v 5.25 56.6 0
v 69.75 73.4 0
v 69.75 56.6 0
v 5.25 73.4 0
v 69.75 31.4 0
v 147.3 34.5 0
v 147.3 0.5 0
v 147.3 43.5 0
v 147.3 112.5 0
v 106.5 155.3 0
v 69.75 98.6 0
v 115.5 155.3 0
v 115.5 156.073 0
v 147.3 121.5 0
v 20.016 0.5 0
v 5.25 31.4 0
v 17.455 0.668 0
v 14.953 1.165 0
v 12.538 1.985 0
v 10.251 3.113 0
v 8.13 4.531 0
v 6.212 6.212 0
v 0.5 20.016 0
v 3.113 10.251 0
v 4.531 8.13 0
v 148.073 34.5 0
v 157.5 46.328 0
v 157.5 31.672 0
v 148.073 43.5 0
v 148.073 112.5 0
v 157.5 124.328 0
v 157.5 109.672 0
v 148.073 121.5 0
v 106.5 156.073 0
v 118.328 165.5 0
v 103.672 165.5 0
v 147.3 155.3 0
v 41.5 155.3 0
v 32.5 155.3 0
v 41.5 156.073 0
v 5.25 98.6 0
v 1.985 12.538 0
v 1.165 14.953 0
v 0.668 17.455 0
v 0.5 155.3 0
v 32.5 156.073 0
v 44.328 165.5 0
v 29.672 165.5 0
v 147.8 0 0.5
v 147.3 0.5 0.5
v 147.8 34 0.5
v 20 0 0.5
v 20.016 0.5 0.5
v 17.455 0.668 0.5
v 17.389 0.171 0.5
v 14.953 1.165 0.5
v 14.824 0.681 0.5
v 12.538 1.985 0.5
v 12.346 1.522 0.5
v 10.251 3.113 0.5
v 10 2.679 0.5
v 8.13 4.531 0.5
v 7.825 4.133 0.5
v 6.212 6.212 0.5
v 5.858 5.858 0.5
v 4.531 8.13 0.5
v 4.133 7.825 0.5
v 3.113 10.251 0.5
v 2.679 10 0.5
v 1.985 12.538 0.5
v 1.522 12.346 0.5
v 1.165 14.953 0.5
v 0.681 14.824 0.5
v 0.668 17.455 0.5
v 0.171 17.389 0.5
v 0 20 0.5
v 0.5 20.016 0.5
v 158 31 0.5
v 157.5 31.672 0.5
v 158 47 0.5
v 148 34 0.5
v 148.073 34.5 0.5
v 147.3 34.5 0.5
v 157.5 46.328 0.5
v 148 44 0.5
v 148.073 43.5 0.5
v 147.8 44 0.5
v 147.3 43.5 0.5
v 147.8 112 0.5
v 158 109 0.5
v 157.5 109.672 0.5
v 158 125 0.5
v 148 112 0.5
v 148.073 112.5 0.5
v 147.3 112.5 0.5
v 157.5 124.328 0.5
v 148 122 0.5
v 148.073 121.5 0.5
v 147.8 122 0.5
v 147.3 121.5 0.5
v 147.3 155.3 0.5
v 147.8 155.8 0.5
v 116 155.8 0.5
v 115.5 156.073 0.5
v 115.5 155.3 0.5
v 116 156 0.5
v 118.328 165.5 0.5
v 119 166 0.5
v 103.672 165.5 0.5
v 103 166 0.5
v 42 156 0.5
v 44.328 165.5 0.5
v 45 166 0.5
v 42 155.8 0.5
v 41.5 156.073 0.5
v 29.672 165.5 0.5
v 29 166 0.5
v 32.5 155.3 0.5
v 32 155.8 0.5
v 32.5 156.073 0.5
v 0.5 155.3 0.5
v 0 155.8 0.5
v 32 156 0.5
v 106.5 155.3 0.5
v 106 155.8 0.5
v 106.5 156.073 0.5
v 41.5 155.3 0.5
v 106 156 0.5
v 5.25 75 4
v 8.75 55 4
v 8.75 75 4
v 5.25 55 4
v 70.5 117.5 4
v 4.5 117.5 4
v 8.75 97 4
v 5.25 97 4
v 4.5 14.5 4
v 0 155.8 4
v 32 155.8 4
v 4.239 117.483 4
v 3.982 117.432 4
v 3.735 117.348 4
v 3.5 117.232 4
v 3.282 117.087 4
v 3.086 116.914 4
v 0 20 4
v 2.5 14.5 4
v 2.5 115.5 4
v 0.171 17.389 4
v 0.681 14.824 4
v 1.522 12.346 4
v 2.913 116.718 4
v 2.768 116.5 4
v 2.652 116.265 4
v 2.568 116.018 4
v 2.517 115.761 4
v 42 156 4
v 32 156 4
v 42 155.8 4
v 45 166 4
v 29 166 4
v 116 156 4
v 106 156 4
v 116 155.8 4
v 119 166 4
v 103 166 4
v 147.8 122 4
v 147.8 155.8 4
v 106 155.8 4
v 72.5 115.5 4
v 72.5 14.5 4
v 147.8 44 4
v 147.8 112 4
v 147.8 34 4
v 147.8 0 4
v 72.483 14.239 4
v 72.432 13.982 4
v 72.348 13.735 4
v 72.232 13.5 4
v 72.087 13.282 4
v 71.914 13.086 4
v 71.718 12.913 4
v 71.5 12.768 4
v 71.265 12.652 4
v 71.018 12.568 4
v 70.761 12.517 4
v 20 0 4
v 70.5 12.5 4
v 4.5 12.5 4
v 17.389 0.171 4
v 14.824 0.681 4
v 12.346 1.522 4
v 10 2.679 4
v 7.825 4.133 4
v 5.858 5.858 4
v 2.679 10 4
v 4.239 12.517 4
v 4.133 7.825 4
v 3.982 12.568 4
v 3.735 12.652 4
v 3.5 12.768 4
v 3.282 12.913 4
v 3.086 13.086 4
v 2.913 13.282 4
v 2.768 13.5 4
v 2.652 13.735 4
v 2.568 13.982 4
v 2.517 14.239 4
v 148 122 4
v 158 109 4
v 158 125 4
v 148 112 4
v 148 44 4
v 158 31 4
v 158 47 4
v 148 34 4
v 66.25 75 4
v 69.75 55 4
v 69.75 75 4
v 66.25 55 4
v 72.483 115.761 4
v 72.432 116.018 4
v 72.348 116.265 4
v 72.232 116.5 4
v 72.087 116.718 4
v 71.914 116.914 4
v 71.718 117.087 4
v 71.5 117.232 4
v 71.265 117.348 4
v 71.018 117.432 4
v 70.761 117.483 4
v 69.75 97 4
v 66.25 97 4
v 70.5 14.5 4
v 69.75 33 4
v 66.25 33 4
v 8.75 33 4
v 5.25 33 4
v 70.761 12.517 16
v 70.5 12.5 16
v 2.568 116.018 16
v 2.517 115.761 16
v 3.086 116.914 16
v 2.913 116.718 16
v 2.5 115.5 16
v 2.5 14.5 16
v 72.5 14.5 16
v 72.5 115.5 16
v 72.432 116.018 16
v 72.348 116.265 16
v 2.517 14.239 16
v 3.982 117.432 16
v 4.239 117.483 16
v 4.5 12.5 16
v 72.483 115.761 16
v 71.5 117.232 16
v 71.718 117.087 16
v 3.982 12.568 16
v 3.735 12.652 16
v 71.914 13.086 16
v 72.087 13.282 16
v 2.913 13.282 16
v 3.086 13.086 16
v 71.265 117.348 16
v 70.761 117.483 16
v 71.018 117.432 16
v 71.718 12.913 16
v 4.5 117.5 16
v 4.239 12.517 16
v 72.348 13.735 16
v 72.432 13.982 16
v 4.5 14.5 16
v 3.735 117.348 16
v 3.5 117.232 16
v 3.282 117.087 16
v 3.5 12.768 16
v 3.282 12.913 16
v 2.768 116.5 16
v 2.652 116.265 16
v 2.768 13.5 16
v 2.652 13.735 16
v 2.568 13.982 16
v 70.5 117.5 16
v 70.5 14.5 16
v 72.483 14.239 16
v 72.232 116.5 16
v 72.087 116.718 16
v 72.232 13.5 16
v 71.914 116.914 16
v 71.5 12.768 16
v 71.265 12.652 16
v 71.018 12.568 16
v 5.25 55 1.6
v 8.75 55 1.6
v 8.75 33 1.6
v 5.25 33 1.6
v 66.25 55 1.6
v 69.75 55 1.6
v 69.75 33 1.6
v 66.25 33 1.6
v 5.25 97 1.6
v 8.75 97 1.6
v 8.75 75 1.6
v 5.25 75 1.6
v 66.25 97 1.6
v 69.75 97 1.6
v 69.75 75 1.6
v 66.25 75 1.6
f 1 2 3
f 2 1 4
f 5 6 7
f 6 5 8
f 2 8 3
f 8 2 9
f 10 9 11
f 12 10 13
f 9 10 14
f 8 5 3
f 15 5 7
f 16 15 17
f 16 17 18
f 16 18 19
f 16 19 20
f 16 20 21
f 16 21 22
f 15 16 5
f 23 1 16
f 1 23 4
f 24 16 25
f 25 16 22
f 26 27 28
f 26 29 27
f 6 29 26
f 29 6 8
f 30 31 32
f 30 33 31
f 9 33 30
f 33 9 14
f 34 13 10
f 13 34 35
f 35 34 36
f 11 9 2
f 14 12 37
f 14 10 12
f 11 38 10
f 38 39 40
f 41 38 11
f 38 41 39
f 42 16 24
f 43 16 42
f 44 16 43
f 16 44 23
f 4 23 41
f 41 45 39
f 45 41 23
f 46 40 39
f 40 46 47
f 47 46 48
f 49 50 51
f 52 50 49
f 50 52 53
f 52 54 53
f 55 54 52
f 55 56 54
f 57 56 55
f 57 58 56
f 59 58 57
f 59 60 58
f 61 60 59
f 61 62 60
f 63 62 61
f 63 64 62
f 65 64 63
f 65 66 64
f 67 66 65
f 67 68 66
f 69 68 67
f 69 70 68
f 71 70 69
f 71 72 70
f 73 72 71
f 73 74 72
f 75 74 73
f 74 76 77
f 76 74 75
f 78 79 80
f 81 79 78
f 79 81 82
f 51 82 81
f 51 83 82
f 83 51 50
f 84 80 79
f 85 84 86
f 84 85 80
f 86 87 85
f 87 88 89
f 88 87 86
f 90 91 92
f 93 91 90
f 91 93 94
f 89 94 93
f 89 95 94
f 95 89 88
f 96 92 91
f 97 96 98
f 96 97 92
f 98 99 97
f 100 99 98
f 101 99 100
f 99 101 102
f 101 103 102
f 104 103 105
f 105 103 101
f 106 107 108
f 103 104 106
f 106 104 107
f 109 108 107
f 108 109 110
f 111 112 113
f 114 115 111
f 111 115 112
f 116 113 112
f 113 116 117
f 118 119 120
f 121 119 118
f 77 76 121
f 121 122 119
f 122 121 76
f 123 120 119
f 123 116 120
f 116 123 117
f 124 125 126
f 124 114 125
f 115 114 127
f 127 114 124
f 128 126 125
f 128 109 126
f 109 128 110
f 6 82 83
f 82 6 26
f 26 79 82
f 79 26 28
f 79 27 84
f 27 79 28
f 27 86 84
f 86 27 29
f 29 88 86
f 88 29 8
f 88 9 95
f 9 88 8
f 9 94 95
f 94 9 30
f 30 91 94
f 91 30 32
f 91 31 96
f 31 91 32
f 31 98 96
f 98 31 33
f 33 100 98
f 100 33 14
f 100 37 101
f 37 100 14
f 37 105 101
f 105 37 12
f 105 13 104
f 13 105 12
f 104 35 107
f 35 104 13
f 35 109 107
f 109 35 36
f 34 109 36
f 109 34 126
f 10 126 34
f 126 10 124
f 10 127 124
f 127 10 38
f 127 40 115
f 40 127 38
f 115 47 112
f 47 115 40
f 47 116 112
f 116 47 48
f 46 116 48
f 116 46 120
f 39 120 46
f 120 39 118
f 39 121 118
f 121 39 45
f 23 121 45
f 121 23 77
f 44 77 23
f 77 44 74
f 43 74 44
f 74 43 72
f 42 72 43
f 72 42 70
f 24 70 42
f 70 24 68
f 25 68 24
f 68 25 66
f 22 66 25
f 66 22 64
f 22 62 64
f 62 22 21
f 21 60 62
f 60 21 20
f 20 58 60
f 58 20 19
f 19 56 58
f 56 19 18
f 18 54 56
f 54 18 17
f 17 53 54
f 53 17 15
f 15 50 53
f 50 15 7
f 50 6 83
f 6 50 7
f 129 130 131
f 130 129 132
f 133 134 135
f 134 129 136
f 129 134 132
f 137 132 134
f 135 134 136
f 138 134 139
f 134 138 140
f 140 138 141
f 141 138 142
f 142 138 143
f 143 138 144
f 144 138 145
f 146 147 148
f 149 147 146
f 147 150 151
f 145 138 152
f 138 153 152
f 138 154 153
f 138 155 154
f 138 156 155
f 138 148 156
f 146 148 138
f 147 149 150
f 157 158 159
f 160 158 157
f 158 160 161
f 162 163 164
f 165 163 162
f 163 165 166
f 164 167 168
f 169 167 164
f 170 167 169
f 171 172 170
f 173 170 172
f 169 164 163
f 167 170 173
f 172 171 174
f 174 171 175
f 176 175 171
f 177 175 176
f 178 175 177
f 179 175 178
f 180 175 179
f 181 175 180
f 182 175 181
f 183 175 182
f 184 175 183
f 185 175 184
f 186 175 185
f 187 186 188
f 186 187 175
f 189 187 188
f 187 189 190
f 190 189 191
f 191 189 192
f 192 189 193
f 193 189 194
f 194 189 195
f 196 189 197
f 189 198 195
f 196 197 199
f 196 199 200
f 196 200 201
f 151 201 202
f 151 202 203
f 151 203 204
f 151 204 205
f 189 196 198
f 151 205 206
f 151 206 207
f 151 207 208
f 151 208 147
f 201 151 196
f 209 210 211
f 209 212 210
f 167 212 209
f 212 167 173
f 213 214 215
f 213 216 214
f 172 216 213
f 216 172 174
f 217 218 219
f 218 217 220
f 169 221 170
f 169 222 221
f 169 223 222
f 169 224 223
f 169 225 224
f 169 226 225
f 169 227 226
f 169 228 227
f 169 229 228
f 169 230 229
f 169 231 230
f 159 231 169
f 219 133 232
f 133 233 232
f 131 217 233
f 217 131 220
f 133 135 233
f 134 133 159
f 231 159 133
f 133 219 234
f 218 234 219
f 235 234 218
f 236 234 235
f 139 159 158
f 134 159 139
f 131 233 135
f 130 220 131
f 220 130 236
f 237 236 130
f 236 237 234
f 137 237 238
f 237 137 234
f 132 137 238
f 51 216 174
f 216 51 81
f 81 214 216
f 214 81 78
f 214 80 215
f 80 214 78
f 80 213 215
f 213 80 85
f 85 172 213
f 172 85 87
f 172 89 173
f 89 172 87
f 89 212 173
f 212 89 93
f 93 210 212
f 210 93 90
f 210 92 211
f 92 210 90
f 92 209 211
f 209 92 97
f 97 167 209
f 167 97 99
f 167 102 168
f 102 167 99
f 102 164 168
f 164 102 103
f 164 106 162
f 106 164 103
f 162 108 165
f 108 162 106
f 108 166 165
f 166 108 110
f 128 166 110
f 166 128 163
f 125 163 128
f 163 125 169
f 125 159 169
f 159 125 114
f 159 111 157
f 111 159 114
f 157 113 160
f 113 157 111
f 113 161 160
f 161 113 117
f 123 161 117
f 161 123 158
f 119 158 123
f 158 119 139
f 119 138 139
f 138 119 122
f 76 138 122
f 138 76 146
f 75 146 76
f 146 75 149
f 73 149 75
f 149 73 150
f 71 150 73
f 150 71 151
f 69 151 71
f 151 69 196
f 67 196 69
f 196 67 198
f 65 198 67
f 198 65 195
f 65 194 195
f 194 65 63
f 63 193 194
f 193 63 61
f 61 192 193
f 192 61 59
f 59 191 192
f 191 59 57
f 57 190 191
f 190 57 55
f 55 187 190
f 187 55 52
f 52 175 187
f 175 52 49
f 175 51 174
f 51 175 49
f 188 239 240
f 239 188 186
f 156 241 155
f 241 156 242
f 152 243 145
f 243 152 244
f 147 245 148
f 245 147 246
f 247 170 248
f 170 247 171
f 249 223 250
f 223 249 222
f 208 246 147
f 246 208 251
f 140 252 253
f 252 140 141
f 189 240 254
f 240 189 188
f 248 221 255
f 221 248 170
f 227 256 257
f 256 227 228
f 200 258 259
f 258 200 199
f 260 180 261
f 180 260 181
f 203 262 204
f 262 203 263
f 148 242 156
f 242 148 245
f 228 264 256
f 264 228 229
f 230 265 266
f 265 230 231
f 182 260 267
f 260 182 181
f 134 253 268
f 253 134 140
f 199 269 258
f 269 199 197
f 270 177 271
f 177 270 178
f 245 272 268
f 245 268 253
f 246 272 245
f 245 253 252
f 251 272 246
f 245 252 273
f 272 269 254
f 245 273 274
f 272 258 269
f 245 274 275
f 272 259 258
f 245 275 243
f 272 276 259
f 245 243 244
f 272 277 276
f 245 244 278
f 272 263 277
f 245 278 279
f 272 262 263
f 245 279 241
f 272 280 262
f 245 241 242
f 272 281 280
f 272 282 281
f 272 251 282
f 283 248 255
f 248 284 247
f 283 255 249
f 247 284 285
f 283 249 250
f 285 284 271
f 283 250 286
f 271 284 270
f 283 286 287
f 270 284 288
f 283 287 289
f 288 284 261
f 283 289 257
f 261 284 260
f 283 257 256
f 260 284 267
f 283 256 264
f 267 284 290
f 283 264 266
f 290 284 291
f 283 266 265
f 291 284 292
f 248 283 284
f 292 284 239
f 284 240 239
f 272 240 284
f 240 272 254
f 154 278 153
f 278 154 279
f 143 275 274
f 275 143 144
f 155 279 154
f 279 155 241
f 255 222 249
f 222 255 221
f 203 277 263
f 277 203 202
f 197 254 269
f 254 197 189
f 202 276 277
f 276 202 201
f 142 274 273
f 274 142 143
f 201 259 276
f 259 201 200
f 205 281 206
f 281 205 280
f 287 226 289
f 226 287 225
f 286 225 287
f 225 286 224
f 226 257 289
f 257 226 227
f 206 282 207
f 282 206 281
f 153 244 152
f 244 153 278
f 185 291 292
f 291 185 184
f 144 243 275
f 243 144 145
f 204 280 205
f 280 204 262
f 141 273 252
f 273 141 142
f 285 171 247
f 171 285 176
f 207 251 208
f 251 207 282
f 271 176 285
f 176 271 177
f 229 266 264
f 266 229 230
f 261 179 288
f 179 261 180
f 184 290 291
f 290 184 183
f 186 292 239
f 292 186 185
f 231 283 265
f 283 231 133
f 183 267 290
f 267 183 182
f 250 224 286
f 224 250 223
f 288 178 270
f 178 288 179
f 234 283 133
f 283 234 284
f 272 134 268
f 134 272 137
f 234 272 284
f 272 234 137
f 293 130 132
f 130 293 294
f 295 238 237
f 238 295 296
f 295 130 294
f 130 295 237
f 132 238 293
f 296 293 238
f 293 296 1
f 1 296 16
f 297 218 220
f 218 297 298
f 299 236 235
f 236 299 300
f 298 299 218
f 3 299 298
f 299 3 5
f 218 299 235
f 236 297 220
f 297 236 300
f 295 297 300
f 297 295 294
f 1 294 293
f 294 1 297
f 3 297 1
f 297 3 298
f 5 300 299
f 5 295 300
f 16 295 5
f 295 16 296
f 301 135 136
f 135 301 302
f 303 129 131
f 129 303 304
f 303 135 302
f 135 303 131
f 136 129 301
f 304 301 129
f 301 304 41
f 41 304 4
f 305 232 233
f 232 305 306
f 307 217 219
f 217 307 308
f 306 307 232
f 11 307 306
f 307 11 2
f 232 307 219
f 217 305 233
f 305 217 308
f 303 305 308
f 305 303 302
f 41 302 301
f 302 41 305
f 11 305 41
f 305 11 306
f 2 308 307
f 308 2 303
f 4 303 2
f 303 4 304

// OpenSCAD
// file: params.scad
// ===========================================================================
//  Apache 4800 cyberdeck v2 - shared parameters (all mm)
//  Every part file includes this through parts.scad.
//  Values marked [CHECK] are defaults from the spec: measure the real part and
//  change them here, then run build.cmd again to re-export every STL.
// ===========================================================================

// ---- printer limits --------------------------------------------------------
bed_max    = 175;      // max footprint X and Y
height_max = 150;

// ---- case: Harbor Freight Apache 4800 ---------------------------------------
case_in      = [454, 327];  // interior at the rim (listed)
tray         = [444, 312];  // [CHECK] printed tray outline = floor at the very bottom
tray_r       = 20;          // [CHECK] inside corner radius
base_depth   = 115;         // [CHECK] floor to rim
lid_depth    = 44;          // [CHECK]
height_limit = 100;         // nothing in the base taller than this above the floor

// ---- floor tiles (3 x 2) -----------------------------------------------------
tile_cols = 3;
tile_rows = 2;
tile_t    = 4;
tile_gap  = 0.4;                       // total gap between neighbouring tiles
tile_sz   = [tray[0] / tile_cols, tray[1] / tile_rows];   // 148 x 156
vent_sz     = 15;
vent_pitch  = 25;
vent_margin = 8;                       // keep vents this far from tile edges
chamfer     = 0.5;                     // bottom-edge chamfer (elephant foot)

// ---- tile joints (dovetail tabs printed on the tiles - no loose keys) -------
tab_neck  = 10;      // width where the tab leaves its tile
tab_head  = 16;      // width at the tip (wider = locks)
tab_len   = 10;      // how far it reaches into the next tile
tab_clear = 0.2;     // gap around the tab in the socket (per side); raise if too tight

// ---- Velcro straps ------------------------------------------------------------
strap_w      = 22;   // slot length (20 mm strap + room)
strap_slot_t = 3.5;  // slot width
strap_groove = 1.6;  // groove depth under a floor for the strap (leaves >= 2.4 mm of floor)

// ---- layout (top view; origin = front-left of tray, X right, Y to hinge) ----
// [x0, y0, x1, y1]
hub_box    = [75,   6, 245,  56];
pi_box     = [75,  60, 245, 138];
power_box  = [75, 142, 245, 282];
switch_box = [2.5, 12.5, 72.5, 117.5];
signal_lane = [0, 286, tray[0], 298];
power_lane  = [0, 300, tray[0], 312];

// ---- the PC: Minisforum UM870 Slim (names still say k12 so nothing else breaks) ----
k12      = [130, 126.5, 50.4];    // listed (was GMKtec K12: 154 x 151 x 73.6)
k12_pos  = [266, 40];             // front-left corner on the tray (same spot as the K12)
// [CHECK] open air behind the PC: assumes it blows hot air out the back.
// Once the UM870 is here, check where its vents really are.
rear_air = [k12_pos[0], k12_pos[1] + k12[1], 420, 286];
plinth_margin = 8;
plinth_h      = 15;
plinth_rim    = 8;                // solid border: corner guides sit fully on it
hex_cell      = 10;               // across flats
hex_wall      = 2;
plinth_post_front_h = 20;         // above the honeycomb
plinth_post_rear_h  = 10;         // keep the rear exhaust clear (spec: <= 10)
plinth_post_leg     = 15;
plinth_post_t       = 3;
k12_clear           = 1;
plinth_box = [k12_pos[0] - plinth_margin, k12_pos[1] - plinth_margin,
              k12_pos[0] + k12[0] + plinth_margin, k12_pos[1] + k12[1] + plinth_margin];

// ---- USB hub (Vantisan) -----------------------------------------------------------
hub      = [161, 42, 25];        // measured
hub_fit  = 1;                    // clearance (total)
hub_wall_h       = 16;           // back/side walls above the floor
hub_front_wall_h = 8;            // [CHECK] low front wall: ports face up/front
hub_floor        = 4;
hub_cable_end    = "right";      // cable exit notch end: "right" (toward the PC) or "left"

// ---- Raspberry Pi 5 in CanaKit case ------------------------------------------------
pi_case   = [95, 65, 30];        // measured (height est.)
pi_fit    = 1;
pi_floor  = 4;
pi_guide_h  = 12;
pi_vent_gap = 15;                // open space between Pi and the cable cubby
cubby_wall_h = 15;

// ---- power bay ------------------------------------------------------------------
brick  = [150, 65, 35];          // [CHECK] PC 120 W brick (UM870: 19 V / 6.32 A) - measure it
strip  = [130, 60, 40];          // [CHECK] compact 3-outlet surge strip
power_floor  = 4;
power_wall_h = 30;               // above the floor
power_wall_t = 3;
brick_rib_h  = 4;                // air gap under the brick

// ---- network switch -----------------------------------------------------------------
switch_sz   = [65, 100, 25];     // [CHECK] (X = width, Y = length, ports at back)
switch_fit  = 1;
switch_floor  = 4;
switch_wall_h = 12;

// ---- cable lanes ---------------------------------------------------------------------
rib_h      = 10;
rib_t      = 2.4;
rib_foot_w = 8;
rib_foot_t = 2;
rib_y      = 299;                // centre line between the lanes
comb_w     = 20;                 // comb thickness along the lane

// ---- left-wall side panel -------------------------------------------------------------
panel      = [150, 60];
panel_outer_t = 4;
panel_inner_t = 3;
wall_cutout   = [135, 42];       // [CHECK] must sit inside the flat area of the wall
panel_y_center = 215;            // along the case wall (tray Y)
keystone_hole  = [14.5, 16.0];   // print keystone_test.stl first and adjust
keystone_relief = [17.5, 24];    // back-side pocket so the latch sees a thin plate
keystone_latch_t = 2.0;          // plate thickness where the keystone clips on
keystone_pitch = 19.5;
// Power entry: "iec" = snap-in C14 inlet (recommended - see README) or "slot" = cord slot
power_entry  = "iec";
iec_hole     = [27.5, 19.8];     // [CHECK] snap-in C14 inlet cutout
iec_relief   = [31, 24];
iec_latch_t  = 2.0;
cord_slot    = [25, 12];
m4_hole      = 4.3;
labels = ["LAN", "PC", "MIC", "AUD", "USB", "PWR"];
cover_clear  = 9;                // room in front of the plate for couplers/bolt heads

// ---- lid monitor clips (ViewSonic VA1655) ------------------------------------------------
monitor     = [359, 227];        // listed (spec value used; re-measure the width)
mon_thick   = 20;                // thick edge (measured)
mon_thin    = 10;                // thin edge (measured)
thick_edge  = "bottom";          // [CHECK] "bottom" = hinge side when the lid is open
foam_t      = 1.5;               // foam on every face touching the monitor
clip_wall_t = 3;
clip_lip    = 3;                 // overlap onto the bezel only
clip_lip_t  = 2.5;
clip_buttress = 12;              // VHB foot width outside the wall
clip_leg    = 45;                // leg length along the monitor edge, from the corner
clip_port_leg = 20;              // [CHECK] shorter leg along the RIGHT edge (port zone)

// ---- print settings reference (set these in the slicer) ---------------------------------
// 0.4 nozzle, 0.2 layers, 4 walls, 25-30% gyroid
// holes already include +0.3 mm
$fn = 48;
// main file
// Floor tile with dovetail tabs built in. Export with -D col=0..2 -D row=0..1 (build.cmd does all six).
// Back-row tiles (row=1) include the cable-lane rib; tile col=0,row=0 includes the switch holder.
include <parts.scad>
col = 0;
row = 0;
floor_tile(col, row);
